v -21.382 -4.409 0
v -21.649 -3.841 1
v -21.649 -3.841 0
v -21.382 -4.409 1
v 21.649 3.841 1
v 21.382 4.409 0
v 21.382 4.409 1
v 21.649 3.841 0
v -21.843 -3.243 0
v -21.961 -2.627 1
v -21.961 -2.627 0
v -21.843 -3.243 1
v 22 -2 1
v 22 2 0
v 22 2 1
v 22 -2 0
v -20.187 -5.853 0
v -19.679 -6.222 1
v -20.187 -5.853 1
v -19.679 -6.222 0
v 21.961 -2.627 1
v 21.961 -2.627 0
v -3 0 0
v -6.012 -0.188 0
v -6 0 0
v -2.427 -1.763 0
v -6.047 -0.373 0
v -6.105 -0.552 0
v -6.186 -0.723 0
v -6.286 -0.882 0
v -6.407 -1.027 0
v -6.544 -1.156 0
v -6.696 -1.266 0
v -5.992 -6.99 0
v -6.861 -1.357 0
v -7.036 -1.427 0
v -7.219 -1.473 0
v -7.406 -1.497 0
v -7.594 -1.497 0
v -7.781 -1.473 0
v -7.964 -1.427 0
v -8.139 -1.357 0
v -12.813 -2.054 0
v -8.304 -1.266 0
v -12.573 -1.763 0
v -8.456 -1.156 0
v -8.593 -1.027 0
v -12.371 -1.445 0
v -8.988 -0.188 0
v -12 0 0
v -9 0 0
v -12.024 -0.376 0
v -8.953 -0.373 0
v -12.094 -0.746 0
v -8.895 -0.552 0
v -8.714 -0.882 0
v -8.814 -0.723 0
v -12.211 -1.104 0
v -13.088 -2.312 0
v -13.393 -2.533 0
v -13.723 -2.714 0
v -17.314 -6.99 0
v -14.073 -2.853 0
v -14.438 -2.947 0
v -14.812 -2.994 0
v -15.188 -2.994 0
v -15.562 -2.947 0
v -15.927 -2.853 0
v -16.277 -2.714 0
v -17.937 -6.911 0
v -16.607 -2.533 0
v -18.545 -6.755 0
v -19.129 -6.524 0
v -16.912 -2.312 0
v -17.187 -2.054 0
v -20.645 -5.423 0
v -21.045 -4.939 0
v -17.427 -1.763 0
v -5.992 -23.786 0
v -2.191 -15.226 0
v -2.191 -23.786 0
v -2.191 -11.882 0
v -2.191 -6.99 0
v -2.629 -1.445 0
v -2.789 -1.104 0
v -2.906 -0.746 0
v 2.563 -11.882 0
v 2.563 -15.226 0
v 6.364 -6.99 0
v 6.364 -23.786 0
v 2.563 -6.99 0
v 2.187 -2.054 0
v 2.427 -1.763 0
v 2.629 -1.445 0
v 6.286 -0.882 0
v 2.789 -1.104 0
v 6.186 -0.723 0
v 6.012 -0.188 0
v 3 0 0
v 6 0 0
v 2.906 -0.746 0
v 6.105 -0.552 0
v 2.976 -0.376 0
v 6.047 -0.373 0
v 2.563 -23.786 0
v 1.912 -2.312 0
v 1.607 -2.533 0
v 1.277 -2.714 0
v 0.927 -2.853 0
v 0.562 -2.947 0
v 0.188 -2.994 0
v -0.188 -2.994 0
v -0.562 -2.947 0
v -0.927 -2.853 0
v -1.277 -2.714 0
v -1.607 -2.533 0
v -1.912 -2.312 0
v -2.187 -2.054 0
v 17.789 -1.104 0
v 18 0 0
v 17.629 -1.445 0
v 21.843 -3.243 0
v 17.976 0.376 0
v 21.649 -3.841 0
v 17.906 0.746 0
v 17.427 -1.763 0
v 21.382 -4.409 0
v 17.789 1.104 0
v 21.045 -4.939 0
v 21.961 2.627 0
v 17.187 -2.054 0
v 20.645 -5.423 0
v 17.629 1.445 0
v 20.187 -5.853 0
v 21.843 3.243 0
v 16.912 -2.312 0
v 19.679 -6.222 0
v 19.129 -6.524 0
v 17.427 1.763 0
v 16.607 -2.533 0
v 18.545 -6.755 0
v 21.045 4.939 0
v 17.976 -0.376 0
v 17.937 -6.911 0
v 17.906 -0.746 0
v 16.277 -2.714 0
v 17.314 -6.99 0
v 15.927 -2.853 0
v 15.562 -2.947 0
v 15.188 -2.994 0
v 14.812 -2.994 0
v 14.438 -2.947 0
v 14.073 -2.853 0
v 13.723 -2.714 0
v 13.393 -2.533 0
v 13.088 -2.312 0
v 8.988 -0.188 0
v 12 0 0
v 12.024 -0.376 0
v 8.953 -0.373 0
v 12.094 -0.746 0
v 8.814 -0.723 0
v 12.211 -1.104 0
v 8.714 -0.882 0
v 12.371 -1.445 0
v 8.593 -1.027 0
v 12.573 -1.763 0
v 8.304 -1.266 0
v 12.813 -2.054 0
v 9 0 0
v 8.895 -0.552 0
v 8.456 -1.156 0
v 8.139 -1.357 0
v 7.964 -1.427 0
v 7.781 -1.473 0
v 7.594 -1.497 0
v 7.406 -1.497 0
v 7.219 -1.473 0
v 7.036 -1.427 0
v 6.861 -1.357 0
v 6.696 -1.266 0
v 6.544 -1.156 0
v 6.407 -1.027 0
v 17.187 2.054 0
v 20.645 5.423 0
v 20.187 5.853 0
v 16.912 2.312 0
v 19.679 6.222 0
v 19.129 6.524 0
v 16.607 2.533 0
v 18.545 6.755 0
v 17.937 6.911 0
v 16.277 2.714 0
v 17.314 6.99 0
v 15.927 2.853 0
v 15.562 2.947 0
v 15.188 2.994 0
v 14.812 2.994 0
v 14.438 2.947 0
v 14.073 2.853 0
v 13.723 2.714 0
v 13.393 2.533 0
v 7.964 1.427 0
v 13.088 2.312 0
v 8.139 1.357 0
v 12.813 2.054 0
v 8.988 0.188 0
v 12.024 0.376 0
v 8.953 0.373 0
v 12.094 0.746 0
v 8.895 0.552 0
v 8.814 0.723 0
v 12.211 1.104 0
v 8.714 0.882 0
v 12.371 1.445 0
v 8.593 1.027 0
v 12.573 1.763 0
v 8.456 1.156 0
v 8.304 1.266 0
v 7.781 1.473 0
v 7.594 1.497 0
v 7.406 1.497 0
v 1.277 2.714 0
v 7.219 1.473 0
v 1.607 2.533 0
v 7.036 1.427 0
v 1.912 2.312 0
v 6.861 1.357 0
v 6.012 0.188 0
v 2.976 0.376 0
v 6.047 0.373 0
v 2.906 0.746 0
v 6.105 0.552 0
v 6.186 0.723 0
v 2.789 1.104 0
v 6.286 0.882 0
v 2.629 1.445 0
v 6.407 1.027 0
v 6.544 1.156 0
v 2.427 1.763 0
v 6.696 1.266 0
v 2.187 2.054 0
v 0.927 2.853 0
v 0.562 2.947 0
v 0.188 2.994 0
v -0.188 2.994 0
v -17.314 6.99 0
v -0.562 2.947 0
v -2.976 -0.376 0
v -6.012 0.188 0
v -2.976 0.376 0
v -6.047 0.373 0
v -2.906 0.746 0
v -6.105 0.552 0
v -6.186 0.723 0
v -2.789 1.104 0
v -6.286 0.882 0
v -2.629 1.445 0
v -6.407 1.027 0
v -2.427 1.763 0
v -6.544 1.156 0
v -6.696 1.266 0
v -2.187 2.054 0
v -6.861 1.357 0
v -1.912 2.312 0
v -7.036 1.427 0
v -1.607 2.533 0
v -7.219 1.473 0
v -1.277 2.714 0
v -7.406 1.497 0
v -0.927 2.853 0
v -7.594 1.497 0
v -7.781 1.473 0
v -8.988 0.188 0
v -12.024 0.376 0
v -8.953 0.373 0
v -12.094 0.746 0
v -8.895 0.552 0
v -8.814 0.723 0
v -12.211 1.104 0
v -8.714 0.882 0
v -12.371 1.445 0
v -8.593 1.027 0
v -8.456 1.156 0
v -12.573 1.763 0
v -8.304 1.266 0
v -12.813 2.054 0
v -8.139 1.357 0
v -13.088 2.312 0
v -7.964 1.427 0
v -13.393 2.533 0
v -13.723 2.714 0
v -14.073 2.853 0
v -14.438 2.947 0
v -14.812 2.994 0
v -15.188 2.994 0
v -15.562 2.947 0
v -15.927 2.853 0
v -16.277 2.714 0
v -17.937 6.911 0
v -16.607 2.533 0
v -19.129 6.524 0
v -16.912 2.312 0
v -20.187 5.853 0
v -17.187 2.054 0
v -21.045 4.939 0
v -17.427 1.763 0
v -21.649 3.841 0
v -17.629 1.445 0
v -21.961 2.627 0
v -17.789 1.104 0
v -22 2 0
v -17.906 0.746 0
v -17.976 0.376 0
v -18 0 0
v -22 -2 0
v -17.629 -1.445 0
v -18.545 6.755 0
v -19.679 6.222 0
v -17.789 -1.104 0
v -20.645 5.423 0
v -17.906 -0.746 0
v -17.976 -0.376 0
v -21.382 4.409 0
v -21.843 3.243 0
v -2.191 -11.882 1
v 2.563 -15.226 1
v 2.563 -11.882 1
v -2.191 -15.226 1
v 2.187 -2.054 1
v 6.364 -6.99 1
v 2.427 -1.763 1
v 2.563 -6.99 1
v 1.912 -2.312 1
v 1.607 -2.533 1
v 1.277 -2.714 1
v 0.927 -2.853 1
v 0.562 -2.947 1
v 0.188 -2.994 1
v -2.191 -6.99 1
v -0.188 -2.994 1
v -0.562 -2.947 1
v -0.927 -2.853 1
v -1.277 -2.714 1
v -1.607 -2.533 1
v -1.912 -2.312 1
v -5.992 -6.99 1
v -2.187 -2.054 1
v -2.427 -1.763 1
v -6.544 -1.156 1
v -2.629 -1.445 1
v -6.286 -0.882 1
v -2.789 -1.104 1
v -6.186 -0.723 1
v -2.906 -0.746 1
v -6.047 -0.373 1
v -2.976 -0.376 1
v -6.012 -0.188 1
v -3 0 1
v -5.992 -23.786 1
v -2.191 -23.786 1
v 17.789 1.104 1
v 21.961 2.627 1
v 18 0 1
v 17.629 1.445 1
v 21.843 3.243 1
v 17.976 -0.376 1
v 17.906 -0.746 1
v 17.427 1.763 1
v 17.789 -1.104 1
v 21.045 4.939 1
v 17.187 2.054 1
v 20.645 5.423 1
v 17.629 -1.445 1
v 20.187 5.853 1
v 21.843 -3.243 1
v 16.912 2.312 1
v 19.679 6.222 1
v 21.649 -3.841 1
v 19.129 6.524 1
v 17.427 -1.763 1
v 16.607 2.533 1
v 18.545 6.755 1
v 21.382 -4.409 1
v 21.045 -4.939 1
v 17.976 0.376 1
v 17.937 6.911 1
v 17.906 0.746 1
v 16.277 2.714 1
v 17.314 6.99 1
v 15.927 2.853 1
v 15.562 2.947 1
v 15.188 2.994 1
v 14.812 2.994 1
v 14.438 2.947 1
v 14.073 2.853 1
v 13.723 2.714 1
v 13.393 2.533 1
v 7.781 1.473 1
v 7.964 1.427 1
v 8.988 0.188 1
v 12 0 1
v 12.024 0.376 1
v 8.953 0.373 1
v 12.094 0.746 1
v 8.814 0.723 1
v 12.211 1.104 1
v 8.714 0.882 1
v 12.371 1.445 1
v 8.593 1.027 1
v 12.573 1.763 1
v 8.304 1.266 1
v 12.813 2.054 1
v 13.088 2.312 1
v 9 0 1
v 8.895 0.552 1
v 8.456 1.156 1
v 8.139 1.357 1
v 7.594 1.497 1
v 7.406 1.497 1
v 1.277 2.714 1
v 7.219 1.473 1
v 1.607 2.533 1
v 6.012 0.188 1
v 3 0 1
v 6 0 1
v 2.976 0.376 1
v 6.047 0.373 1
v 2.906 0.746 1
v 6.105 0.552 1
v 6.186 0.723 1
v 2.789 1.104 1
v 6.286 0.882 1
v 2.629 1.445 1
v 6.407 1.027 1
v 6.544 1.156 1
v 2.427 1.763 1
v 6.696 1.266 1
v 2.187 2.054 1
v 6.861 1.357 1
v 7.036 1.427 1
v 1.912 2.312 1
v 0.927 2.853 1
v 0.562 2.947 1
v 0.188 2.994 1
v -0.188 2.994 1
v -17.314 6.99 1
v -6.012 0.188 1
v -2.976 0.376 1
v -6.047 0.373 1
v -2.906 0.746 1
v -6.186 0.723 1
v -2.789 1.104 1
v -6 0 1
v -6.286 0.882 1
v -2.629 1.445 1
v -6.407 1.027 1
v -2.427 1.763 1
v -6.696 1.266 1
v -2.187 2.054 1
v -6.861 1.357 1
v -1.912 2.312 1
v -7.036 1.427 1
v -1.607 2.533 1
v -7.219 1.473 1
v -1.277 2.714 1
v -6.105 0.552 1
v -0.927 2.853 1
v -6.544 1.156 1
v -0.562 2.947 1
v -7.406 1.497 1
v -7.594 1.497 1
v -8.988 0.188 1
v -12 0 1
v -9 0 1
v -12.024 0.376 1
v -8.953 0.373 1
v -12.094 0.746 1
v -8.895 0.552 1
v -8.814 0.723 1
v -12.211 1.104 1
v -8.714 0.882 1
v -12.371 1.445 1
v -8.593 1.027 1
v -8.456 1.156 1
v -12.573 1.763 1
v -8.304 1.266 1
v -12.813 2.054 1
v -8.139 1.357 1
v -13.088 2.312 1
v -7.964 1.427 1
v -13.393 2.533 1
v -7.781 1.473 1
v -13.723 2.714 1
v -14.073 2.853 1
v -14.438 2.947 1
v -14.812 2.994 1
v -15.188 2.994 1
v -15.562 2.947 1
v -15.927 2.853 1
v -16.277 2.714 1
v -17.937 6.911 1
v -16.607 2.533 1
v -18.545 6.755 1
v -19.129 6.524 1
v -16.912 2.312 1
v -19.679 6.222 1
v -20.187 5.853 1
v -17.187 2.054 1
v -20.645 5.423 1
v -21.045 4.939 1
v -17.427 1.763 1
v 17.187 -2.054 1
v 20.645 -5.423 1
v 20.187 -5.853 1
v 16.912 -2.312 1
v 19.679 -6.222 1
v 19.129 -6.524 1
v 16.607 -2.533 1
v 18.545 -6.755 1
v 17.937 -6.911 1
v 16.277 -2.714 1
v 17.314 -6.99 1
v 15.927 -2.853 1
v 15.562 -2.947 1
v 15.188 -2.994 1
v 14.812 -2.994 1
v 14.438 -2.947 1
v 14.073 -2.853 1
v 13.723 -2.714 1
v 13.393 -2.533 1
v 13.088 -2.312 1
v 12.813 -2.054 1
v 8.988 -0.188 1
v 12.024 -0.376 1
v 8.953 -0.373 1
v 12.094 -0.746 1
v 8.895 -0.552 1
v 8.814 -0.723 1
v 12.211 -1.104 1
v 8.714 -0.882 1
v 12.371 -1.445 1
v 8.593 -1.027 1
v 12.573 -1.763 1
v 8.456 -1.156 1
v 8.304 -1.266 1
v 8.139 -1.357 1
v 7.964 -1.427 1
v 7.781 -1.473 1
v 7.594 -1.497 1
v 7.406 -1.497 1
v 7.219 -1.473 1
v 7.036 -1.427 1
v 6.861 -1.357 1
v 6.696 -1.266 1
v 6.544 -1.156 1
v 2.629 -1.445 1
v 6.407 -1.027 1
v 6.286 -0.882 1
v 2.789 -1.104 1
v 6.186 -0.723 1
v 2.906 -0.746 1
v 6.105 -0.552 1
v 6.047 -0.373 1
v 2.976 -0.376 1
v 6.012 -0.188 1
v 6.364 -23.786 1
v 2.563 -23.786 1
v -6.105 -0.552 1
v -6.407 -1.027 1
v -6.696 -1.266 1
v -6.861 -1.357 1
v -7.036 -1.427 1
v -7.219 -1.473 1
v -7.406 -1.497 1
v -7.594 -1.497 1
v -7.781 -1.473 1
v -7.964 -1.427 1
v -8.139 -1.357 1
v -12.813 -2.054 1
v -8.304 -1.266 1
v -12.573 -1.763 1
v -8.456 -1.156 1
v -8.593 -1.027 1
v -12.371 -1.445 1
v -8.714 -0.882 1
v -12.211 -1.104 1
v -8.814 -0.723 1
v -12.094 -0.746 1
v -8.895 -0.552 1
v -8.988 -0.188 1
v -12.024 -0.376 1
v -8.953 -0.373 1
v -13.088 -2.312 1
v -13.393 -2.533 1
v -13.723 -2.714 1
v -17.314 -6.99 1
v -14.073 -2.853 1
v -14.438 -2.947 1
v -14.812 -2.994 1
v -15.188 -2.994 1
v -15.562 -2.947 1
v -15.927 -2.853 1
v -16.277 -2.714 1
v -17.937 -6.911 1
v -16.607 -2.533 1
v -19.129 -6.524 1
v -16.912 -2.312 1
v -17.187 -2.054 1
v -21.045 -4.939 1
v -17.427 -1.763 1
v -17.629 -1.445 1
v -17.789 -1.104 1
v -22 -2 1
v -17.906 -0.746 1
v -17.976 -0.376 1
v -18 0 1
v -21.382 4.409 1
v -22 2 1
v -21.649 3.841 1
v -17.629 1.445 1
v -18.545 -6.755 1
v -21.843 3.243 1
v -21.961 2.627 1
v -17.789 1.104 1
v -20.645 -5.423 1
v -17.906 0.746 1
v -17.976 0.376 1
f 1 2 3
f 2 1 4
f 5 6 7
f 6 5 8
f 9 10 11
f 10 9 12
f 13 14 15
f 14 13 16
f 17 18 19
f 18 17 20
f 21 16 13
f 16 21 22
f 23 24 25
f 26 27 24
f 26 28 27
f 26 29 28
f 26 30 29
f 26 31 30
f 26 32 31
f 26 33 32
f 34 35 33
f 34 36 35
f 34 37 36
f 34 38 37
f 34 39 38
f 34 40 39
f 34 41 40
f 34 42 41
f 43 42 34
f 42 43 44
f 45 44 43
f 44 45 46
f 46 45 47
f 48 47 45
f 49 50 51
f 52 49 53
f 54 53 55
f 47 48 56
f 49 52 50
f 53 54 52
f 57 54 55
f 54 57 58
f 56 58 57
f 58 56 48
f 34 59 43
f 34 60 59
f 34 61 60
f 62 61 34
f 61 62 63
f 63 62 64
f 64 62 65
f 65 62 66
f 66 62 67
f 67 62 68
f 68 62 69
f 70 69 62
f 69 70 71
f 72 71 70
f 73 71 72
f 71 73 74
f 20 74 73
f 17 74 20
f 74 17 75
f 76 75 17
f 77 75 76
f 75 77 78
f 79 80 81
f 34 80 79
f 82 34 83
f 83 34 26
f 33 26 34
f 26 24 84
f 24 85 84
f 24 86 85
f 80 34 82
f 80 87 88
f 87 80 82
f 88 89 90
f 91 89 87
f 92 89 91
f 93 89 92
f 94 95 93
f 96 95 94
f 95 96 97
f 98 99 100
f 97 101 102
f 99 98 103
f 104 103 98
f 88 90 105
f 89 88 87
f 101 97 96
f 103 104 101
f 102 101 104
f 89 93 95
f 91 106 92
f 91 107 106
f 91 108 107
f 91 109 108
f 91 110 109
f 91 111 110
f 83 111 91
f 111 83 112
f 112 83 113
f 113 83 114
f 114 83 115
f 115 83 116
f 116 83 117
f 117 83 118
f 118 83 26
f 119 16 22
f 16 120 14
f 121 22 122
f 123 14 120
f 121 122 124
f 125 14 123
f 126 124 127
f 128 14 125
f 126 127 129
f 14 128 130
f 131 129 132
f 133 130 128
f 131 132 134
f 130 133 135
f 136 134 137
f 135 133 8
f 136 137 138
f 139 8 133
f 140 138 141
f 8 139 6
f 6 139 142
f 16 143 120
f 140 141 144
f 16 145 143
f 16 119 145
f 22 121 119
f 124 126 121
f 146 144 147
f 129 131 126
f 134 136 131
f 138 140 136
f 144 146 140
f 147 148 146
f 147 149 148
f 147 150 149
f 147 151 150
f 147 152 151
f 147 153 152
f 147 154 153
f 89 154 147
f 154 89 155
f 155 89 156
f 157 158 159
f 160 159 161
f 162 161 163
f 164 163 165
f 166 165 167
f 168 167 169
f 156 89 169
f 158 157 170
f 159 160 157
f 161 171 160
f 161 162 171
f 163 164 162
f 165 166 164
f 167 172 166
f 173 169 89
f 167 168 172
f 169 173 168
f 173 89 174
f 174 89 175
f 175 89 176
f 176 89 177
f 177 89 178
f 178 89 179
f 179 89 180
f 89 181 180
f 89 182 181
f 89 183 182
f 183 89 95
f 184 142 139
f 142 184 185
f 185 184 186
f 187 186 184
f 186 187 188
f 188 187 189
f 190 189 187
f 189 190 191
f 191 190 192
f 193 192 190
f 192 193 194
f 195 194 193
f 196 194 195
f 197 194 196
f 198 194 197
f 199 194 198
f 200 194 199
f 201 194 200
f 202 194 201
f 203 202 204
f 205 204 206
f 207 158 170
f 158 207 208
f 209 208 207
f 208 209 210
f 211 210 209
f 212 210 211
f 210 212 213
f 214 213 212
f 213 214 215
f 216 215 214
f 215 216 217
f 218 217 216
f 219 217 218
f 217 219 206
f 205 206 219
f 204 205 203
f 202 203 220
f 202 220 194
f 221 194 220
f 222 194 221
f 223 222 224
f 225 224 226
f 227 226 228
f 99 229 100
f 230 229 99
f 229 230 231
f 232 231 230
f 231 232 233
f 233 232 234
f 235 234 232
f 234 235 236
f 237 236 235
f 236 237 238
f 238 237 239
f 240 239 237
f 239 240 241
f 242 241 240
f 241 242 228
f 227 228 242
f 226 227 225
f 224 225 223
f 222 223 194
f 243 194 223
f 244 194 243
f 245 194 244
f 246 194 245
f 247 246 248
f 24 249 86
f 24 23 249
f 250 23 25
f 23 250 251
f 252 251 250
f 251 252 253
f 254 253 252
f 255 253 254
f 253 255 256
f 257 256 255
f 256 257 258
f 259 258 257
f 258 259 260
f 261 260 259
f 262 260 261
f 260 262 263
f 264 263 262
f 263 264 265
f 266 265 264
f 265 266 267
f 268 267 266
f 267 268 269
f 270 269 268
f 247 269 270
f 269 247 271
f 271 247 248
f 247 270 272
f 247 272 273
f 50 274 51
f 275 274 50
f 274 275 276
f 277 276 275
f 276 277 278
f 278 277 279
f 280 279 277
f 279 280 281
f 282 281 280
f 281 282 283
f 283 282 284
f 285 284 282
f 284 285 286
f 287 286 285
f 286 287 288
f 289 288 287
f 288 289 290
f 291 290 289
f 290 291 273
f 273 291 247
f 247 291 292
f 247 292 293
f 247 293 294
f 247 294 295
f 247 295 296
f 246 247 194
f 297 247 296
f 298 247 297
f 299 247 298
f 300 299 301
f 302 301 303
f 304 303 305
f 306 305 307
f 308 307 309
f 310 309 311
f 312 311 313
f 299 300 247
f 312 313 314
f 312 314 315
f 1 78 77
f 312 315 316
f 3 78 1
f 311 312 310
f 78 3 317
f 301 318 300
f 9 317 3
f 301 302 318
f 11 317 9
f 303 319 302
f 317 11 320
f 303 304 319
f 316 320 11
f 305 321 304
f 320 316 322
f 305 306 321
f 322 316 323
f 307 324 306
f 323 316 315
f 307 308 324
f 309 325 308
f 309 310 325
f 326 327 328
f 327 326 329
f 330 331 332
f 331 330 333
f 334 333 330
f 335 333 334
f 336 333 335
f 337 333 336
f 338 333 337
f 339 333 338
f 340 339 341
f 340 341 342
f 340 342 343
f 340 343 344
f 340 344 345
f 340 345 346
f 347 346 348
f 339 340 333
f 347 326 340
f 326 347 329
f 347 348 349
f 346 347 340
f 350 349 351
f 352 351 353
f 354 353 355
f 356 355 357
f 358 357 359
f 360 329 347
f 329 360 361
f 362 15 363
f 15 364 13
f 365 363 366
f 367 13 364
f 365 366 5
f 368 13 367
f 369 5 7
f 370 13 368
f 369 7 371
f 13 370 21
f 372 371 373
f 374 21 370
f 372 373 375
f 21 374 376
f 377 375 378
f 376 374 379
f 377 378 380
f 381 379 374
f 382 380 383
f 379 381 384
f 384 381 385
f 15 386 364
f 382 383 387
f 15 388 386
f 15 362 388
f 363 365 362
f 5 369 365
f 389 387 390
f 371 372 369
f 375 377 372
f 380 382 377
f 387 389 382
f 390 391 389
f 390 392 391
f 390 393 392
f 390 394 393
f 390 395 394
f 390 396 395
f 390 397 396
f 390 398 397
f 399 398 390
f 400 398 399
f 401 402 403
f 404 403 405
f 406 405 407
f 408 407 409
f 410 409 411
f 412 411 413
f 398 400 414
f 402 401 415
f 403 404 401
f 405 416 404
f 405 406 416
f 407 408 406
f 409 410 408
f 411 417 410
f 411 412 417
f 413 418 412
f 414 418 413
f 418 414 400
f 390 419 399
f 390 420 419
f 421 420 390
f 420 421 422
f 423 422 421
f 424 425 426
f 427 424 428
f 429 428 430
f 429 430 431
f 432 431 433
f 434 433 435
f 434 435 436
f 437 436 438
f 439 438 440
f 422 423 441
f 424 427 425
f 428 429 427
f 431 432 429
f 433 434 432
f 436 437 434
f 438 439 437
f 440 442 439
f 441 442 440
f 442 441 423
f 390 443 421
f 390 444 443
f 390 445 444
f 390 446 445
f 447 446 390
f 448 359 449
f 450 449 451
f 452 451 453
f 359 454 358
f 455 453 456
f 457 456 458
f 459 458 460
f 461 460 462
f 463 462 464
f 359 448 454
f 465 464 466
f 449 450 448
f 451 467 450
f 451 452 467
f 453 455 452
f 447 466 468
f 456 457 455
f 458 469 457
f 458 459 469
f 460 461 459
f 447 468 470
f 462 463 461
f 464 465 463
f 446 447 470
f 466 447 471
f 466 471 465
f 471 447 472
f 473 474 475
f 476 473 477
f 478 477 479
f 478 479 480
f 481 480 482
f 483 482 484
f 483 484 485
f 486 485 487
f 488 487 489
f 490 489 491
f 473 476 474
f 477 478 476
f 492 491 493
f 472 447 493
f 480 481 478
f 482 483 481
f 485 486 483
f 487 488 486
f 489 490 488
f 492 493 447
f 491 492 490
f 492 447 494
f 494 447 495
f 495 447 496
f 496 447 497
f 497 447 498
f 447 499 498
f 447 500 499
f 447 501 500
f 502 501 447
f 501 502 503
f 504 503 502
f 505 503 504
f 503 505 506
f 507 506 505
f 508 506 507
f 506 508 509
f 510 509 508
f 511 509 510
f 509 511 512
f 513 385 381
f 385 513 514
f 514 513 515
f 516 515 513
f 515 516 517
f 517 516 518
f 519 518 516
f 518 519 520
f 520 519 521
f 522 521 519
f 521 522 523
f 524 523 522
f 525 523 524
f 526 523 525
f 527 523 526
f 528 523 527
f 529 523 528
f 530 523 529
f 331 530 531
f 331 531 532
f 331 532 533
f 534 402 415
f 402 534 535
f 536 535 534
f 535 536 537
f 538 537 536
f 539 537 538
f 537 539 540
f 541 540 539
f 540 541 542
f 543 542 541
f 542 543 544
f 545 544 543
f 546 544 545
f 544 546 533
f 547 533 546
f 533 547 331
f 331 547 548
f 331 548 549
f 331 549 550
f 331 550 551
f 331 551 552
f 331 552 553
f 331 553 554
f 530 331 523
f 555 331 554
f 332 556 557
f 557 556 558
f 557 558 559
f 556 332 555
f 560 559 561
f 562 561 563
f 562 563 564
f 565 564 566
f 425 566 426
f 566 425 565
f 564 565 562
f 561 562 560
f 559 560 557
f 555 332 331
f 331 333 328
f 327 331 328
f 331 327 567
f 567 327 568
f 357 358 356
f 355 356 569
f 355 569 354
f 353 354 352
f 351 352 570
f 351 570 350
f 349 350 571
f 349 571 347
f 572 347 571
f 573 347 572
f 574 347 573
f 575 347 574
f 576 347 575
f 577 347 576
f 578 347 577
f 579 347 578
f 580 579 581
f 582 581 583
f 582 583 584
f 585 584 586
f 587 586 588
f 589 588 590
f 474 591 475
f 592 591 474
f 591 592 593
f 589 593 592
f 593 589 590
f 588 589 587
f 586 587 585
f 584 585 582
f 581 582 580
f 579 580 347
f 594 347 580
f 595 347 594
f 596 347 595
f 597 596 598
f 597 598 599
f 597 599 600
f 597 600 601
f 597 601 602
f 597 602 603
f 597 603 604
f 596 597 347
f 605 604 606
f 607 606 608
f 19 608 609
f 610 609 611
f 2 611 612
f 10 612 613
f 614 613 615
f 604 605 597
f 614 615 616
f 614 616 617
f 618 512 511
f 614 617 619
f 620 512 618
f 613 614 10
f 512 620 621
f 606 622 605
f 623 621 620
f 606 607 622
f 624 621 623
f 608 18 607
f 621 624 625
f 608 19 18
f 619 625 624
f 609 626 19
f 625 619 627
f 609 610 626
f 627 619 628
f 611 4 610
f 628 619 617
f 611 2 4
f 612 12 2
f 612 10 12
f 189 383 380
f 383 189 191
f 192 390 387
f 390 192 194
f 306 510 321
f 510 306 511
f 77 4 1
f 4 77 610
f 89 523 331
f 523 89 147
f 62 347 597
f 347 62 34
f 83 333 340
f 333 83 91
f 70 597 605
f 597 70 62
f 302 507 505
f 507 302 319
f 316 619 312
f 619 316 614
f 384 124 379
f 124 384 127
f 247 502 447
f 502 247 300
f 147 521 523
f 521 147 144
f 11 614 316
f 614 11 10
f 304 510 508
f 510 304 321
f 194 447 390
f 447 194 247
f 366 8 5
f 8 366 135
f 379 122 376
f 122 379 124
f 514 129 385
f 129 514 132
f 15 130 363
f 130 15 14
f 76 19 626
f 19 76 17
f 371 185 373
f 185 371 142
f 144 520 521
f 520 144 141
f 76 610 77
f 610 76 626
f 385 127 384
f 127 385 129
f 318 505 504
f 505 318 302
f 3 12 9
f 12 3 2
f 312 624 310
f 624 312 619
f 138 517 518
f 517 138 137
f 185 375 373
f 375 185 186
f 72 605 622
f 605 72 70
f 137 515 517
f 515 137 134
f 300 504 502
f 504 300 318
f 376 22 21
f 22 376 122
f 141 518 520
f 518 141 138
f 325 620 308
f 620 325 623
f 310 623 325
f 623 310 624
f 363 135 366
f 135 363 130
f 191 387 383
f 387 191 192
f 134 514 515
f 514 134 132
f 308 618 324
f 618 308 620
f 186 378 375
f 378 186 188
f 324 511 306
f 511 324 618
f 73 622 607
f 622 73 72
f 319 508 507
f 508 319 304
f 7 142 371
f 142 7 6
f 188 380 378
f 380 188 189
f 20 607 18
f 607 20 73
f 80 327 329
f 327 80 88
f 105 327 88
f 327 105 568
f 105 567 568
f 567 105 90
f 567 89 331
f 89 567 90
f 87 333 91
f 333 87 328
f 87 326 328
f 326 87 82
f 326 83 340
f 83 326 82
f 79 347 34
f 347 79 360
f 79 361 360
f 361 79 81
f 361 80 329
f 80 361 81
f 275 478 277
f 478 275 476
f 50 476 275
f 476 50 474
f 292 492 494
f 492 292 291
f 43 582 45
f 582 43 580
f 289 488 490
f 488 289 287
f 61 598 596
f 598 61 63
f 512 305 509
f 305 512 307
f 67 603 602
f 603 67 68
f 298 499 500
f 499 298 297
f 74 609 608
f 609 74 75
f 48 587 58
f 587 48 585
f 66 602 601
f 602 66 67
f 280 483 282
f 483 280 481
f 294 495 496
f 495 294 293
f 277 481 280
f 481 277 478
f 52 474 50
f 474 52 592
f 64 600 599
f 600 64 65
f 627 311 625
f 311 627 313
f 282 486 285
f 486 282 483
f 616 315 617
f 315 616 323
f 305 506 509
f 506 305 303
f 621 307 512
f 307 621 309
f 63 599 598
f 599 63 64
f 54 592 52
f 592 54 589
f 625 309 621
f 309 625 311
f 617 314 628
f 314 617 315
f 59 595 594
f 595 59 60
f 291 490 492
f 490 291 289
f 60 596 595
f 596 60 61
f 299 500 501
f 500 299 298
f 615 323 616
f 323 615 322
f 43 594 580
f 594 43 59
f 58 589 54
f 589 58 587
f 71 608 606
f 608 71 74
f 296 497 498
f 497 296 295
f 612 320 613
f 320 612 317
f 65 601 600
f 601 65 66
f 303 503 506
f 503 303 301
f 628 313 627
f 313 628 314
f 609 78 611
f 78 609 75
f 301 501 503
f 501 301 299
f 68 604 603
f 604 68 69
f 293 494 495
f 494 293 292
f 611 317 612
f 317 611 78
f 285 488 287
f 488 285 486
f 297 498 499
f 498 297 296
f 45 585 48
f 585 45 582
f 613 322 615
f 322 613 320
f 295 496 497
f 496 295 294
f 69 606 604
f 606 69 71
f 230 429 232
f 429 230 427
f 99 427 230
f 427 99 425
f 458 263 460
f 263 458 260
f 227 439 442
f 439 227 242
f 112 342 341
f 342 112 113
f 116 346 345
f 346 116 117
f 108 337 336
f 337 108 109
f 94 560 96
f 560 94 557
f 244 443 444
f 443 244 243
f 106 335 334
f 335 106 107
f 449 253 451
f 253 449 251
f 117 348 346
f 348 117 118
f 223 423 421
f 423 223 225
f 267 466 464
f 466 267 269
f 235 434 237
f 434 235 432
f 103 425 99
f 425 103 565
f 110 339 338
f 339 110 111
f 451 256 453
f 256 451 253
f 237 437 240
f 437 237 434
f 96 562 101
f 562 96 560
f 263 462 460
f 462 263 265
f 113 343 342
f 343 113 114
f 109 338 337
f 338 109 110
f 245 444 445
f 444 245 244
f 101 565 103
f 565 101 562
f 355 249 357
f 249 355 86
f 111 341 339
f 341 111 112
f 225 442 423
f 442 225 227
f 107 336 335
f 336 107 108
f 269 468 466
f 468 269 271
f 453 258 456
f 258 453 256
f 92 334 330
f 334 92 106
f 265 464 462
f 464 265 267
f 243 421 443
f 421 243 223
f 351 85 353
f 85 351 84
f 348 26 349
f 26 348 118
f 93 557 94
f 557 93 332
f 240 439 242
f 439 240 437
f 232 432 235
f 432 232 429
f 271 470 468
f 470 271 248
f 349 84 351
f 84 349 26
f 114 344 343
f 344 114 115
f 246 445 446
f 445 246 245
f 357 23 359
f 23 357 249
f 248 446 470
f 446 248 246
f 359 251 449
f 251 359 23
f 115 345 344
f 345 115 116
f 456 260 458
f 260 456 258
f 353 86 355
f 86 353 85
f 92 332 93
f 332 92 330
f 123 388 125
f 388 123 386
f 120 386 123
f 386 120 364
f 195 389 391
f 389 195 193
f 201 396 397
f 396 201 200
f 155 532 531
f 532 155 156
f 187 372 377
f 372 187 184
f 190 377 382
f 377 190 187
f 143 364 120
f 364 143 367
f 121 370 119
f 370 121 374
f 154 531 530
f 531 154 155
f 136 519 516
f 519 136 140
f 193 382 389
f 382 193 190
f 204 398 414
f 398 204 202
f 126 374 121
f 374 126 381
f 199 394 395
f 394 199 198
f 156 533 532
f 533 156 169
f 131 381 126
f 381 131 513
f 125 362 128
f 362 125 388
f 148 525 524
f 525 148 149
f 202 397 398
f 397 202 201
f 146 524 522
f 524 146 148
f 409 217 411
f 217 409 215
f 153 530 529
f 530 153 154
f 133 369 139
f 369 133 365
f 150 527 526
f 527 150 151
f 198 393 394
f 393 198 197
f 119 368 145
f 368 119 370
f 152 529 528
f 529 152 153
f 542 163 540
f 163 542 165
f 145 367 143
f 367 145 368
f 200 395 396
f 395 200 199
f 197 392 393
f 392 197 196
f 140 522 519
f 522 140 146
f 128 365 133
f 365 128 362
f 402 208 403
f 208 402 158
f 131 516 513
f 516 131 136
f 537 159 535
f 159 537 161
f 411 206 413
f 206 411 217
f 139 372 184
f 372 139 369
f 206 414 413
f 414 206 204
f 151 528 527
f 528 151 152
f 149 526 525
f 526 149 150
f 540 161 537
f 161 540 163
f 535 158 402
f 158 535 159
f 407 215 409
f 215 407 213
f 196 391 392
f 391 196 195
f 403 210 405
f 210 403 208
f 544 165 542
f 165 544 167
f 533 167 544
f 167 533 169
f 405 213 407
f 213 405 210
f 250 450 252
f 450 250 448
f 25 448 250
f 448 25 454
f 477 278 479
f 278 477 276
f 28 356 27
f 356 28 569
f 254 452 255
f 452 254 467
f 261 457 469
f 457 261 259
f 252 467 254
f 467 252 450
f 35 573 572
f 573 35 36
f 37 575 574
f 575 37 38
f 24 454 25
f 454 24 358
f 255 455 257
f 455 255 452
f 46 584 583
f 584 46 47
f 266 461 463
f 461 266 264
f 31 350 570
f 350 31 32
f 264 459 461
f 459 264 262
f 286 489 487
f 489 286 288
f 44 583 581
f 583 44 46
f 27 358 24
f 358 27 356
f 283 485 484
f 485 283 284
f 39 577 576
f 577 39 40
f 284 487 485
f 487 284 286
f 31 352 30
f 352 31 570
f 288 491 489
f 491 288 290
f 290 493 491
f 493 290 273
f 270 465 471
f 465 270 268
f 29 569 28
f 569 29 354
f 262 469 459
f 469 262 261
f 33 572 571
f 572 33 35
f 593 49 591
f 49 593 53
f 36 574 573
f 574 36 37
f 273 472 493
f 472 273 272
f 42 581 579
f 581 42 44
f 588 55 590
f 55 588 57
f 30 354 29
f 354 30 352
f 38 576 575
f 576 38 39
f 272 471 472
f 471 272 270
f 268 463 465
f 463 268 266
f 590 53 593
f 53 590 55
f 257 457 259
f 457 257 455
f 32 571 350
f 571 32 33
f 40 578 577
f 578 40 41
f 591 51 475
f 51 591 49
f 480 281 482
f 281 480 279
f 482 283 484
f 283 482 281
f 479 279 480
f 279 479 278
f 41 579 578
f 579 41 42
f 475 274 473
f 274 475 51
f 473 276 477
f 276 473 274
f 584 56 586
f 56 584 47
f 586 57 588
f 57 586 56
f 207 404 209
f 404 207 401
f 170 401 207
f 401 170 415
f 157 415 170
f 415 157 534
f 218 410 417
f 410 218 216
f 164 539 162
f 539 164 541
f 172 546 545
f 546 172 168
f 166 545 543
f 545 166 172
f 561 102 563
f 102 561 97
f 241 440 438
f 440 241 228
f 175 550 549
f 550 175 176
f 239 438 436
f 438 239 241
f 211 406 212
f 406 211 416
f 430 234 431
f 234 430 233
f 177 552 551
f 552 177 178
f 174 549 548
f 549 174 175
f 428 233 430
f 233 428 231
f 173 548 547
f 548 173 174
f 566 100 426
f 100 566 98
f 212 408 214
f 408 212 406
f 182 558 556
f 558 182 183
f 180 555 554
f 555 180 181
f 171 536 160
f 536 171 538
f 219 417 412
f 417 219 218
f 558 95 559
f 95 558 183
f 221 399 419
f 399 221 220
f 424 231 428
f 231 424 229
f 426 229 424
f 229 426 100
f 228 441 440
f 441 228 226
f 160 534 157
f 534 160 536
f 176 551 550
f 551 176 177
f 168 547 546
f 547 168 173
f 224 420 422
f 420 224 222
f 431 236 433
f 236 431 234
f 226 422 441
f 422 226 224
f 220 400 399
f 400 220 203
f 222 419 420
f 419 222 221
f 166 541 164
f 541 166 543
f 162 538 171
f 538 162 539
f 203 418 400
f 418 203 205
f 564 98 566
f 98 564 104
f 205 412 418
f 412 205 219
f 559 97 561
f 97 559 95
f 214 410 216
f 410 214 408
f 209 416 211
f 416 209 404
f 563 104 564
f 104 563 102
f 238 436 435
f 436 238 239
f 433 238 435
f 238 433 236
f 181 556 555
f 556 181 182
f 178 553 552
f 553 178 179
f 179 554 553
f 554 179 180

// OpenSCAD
$fn = 50;


difference() {
	union() {
		hull() {
			translate(v = [-17.0000000000, 2.0000000000, 0]) {
				cylinder(h = 1, r = 5);
			}
			translate(v = [17.0000000000, 2.0000000000, 0]) {
				cylinder(h = 1, r = 5);
			}
			translate(v = [-17.0000000000, -2.0000000000, 0]) {
				cylinder(h = 1, r = 5);
			}
			translate(v = [17.0000000000, -2.0000000000, 0]) {
				cylinder(h = 1, r = 5);
			}
		}
		translate(v = [0, -5, 0]) {
			linear_extrude(height = 1) {
				text(font = "DejaVu Sans Mono:style=Bold", halign = "center", size = 19.0000000000, text = "H", valign = "top");
			}
		}
	}
	union() {
		translate(v = [-15.0000000000, 0.0000000000, 0]) {
			translate(v = [0, 0, -100]) {
				cylinder(h = 200, r = 3.0000000000);
			}
		}
		translate(v = [0, 0, -100]) {
			cylinder(h = 200, r = 3.0000000000);
		}
		translate(v = [15.0000000000, 0.0000000000, 0]) {
			translate(v = [0, 0, -100]) {
				cylinder(h = 200, r = 3.0000000000);
			}
		}
		translate(v = [-15.0000000000, 0.0000000000, 0]) {
			translate(v = [0, 0, -100]) {
				cylinder(h = 200, r = 1.5000000000);
			}
		}
		translate(v = [-7.5000000000, 0.0000000000, 0]) {
			translate(v = [0, 0, -100]) {
				cylinder(h = 200, r = 1.5000000000);
			}
		}
		translate(v = [0, 0, -100]) {
			cylinder(h = 200, r = 1.5000000000);
		}
		translate(v = [7.5000000000, 0.0000000000, 0]) {
			translate(v = [0, 0, -100]) {
				cylinder(h = 200, r = 1.5000000000);
			}
		}
		translate(v = [15.0000000000, 0.0000000000, 0]) {
			translate(v = [0, 0, -100]) {
				cylinder(h = 200, r = 1.5000000000);
			}
		}
	}
}
